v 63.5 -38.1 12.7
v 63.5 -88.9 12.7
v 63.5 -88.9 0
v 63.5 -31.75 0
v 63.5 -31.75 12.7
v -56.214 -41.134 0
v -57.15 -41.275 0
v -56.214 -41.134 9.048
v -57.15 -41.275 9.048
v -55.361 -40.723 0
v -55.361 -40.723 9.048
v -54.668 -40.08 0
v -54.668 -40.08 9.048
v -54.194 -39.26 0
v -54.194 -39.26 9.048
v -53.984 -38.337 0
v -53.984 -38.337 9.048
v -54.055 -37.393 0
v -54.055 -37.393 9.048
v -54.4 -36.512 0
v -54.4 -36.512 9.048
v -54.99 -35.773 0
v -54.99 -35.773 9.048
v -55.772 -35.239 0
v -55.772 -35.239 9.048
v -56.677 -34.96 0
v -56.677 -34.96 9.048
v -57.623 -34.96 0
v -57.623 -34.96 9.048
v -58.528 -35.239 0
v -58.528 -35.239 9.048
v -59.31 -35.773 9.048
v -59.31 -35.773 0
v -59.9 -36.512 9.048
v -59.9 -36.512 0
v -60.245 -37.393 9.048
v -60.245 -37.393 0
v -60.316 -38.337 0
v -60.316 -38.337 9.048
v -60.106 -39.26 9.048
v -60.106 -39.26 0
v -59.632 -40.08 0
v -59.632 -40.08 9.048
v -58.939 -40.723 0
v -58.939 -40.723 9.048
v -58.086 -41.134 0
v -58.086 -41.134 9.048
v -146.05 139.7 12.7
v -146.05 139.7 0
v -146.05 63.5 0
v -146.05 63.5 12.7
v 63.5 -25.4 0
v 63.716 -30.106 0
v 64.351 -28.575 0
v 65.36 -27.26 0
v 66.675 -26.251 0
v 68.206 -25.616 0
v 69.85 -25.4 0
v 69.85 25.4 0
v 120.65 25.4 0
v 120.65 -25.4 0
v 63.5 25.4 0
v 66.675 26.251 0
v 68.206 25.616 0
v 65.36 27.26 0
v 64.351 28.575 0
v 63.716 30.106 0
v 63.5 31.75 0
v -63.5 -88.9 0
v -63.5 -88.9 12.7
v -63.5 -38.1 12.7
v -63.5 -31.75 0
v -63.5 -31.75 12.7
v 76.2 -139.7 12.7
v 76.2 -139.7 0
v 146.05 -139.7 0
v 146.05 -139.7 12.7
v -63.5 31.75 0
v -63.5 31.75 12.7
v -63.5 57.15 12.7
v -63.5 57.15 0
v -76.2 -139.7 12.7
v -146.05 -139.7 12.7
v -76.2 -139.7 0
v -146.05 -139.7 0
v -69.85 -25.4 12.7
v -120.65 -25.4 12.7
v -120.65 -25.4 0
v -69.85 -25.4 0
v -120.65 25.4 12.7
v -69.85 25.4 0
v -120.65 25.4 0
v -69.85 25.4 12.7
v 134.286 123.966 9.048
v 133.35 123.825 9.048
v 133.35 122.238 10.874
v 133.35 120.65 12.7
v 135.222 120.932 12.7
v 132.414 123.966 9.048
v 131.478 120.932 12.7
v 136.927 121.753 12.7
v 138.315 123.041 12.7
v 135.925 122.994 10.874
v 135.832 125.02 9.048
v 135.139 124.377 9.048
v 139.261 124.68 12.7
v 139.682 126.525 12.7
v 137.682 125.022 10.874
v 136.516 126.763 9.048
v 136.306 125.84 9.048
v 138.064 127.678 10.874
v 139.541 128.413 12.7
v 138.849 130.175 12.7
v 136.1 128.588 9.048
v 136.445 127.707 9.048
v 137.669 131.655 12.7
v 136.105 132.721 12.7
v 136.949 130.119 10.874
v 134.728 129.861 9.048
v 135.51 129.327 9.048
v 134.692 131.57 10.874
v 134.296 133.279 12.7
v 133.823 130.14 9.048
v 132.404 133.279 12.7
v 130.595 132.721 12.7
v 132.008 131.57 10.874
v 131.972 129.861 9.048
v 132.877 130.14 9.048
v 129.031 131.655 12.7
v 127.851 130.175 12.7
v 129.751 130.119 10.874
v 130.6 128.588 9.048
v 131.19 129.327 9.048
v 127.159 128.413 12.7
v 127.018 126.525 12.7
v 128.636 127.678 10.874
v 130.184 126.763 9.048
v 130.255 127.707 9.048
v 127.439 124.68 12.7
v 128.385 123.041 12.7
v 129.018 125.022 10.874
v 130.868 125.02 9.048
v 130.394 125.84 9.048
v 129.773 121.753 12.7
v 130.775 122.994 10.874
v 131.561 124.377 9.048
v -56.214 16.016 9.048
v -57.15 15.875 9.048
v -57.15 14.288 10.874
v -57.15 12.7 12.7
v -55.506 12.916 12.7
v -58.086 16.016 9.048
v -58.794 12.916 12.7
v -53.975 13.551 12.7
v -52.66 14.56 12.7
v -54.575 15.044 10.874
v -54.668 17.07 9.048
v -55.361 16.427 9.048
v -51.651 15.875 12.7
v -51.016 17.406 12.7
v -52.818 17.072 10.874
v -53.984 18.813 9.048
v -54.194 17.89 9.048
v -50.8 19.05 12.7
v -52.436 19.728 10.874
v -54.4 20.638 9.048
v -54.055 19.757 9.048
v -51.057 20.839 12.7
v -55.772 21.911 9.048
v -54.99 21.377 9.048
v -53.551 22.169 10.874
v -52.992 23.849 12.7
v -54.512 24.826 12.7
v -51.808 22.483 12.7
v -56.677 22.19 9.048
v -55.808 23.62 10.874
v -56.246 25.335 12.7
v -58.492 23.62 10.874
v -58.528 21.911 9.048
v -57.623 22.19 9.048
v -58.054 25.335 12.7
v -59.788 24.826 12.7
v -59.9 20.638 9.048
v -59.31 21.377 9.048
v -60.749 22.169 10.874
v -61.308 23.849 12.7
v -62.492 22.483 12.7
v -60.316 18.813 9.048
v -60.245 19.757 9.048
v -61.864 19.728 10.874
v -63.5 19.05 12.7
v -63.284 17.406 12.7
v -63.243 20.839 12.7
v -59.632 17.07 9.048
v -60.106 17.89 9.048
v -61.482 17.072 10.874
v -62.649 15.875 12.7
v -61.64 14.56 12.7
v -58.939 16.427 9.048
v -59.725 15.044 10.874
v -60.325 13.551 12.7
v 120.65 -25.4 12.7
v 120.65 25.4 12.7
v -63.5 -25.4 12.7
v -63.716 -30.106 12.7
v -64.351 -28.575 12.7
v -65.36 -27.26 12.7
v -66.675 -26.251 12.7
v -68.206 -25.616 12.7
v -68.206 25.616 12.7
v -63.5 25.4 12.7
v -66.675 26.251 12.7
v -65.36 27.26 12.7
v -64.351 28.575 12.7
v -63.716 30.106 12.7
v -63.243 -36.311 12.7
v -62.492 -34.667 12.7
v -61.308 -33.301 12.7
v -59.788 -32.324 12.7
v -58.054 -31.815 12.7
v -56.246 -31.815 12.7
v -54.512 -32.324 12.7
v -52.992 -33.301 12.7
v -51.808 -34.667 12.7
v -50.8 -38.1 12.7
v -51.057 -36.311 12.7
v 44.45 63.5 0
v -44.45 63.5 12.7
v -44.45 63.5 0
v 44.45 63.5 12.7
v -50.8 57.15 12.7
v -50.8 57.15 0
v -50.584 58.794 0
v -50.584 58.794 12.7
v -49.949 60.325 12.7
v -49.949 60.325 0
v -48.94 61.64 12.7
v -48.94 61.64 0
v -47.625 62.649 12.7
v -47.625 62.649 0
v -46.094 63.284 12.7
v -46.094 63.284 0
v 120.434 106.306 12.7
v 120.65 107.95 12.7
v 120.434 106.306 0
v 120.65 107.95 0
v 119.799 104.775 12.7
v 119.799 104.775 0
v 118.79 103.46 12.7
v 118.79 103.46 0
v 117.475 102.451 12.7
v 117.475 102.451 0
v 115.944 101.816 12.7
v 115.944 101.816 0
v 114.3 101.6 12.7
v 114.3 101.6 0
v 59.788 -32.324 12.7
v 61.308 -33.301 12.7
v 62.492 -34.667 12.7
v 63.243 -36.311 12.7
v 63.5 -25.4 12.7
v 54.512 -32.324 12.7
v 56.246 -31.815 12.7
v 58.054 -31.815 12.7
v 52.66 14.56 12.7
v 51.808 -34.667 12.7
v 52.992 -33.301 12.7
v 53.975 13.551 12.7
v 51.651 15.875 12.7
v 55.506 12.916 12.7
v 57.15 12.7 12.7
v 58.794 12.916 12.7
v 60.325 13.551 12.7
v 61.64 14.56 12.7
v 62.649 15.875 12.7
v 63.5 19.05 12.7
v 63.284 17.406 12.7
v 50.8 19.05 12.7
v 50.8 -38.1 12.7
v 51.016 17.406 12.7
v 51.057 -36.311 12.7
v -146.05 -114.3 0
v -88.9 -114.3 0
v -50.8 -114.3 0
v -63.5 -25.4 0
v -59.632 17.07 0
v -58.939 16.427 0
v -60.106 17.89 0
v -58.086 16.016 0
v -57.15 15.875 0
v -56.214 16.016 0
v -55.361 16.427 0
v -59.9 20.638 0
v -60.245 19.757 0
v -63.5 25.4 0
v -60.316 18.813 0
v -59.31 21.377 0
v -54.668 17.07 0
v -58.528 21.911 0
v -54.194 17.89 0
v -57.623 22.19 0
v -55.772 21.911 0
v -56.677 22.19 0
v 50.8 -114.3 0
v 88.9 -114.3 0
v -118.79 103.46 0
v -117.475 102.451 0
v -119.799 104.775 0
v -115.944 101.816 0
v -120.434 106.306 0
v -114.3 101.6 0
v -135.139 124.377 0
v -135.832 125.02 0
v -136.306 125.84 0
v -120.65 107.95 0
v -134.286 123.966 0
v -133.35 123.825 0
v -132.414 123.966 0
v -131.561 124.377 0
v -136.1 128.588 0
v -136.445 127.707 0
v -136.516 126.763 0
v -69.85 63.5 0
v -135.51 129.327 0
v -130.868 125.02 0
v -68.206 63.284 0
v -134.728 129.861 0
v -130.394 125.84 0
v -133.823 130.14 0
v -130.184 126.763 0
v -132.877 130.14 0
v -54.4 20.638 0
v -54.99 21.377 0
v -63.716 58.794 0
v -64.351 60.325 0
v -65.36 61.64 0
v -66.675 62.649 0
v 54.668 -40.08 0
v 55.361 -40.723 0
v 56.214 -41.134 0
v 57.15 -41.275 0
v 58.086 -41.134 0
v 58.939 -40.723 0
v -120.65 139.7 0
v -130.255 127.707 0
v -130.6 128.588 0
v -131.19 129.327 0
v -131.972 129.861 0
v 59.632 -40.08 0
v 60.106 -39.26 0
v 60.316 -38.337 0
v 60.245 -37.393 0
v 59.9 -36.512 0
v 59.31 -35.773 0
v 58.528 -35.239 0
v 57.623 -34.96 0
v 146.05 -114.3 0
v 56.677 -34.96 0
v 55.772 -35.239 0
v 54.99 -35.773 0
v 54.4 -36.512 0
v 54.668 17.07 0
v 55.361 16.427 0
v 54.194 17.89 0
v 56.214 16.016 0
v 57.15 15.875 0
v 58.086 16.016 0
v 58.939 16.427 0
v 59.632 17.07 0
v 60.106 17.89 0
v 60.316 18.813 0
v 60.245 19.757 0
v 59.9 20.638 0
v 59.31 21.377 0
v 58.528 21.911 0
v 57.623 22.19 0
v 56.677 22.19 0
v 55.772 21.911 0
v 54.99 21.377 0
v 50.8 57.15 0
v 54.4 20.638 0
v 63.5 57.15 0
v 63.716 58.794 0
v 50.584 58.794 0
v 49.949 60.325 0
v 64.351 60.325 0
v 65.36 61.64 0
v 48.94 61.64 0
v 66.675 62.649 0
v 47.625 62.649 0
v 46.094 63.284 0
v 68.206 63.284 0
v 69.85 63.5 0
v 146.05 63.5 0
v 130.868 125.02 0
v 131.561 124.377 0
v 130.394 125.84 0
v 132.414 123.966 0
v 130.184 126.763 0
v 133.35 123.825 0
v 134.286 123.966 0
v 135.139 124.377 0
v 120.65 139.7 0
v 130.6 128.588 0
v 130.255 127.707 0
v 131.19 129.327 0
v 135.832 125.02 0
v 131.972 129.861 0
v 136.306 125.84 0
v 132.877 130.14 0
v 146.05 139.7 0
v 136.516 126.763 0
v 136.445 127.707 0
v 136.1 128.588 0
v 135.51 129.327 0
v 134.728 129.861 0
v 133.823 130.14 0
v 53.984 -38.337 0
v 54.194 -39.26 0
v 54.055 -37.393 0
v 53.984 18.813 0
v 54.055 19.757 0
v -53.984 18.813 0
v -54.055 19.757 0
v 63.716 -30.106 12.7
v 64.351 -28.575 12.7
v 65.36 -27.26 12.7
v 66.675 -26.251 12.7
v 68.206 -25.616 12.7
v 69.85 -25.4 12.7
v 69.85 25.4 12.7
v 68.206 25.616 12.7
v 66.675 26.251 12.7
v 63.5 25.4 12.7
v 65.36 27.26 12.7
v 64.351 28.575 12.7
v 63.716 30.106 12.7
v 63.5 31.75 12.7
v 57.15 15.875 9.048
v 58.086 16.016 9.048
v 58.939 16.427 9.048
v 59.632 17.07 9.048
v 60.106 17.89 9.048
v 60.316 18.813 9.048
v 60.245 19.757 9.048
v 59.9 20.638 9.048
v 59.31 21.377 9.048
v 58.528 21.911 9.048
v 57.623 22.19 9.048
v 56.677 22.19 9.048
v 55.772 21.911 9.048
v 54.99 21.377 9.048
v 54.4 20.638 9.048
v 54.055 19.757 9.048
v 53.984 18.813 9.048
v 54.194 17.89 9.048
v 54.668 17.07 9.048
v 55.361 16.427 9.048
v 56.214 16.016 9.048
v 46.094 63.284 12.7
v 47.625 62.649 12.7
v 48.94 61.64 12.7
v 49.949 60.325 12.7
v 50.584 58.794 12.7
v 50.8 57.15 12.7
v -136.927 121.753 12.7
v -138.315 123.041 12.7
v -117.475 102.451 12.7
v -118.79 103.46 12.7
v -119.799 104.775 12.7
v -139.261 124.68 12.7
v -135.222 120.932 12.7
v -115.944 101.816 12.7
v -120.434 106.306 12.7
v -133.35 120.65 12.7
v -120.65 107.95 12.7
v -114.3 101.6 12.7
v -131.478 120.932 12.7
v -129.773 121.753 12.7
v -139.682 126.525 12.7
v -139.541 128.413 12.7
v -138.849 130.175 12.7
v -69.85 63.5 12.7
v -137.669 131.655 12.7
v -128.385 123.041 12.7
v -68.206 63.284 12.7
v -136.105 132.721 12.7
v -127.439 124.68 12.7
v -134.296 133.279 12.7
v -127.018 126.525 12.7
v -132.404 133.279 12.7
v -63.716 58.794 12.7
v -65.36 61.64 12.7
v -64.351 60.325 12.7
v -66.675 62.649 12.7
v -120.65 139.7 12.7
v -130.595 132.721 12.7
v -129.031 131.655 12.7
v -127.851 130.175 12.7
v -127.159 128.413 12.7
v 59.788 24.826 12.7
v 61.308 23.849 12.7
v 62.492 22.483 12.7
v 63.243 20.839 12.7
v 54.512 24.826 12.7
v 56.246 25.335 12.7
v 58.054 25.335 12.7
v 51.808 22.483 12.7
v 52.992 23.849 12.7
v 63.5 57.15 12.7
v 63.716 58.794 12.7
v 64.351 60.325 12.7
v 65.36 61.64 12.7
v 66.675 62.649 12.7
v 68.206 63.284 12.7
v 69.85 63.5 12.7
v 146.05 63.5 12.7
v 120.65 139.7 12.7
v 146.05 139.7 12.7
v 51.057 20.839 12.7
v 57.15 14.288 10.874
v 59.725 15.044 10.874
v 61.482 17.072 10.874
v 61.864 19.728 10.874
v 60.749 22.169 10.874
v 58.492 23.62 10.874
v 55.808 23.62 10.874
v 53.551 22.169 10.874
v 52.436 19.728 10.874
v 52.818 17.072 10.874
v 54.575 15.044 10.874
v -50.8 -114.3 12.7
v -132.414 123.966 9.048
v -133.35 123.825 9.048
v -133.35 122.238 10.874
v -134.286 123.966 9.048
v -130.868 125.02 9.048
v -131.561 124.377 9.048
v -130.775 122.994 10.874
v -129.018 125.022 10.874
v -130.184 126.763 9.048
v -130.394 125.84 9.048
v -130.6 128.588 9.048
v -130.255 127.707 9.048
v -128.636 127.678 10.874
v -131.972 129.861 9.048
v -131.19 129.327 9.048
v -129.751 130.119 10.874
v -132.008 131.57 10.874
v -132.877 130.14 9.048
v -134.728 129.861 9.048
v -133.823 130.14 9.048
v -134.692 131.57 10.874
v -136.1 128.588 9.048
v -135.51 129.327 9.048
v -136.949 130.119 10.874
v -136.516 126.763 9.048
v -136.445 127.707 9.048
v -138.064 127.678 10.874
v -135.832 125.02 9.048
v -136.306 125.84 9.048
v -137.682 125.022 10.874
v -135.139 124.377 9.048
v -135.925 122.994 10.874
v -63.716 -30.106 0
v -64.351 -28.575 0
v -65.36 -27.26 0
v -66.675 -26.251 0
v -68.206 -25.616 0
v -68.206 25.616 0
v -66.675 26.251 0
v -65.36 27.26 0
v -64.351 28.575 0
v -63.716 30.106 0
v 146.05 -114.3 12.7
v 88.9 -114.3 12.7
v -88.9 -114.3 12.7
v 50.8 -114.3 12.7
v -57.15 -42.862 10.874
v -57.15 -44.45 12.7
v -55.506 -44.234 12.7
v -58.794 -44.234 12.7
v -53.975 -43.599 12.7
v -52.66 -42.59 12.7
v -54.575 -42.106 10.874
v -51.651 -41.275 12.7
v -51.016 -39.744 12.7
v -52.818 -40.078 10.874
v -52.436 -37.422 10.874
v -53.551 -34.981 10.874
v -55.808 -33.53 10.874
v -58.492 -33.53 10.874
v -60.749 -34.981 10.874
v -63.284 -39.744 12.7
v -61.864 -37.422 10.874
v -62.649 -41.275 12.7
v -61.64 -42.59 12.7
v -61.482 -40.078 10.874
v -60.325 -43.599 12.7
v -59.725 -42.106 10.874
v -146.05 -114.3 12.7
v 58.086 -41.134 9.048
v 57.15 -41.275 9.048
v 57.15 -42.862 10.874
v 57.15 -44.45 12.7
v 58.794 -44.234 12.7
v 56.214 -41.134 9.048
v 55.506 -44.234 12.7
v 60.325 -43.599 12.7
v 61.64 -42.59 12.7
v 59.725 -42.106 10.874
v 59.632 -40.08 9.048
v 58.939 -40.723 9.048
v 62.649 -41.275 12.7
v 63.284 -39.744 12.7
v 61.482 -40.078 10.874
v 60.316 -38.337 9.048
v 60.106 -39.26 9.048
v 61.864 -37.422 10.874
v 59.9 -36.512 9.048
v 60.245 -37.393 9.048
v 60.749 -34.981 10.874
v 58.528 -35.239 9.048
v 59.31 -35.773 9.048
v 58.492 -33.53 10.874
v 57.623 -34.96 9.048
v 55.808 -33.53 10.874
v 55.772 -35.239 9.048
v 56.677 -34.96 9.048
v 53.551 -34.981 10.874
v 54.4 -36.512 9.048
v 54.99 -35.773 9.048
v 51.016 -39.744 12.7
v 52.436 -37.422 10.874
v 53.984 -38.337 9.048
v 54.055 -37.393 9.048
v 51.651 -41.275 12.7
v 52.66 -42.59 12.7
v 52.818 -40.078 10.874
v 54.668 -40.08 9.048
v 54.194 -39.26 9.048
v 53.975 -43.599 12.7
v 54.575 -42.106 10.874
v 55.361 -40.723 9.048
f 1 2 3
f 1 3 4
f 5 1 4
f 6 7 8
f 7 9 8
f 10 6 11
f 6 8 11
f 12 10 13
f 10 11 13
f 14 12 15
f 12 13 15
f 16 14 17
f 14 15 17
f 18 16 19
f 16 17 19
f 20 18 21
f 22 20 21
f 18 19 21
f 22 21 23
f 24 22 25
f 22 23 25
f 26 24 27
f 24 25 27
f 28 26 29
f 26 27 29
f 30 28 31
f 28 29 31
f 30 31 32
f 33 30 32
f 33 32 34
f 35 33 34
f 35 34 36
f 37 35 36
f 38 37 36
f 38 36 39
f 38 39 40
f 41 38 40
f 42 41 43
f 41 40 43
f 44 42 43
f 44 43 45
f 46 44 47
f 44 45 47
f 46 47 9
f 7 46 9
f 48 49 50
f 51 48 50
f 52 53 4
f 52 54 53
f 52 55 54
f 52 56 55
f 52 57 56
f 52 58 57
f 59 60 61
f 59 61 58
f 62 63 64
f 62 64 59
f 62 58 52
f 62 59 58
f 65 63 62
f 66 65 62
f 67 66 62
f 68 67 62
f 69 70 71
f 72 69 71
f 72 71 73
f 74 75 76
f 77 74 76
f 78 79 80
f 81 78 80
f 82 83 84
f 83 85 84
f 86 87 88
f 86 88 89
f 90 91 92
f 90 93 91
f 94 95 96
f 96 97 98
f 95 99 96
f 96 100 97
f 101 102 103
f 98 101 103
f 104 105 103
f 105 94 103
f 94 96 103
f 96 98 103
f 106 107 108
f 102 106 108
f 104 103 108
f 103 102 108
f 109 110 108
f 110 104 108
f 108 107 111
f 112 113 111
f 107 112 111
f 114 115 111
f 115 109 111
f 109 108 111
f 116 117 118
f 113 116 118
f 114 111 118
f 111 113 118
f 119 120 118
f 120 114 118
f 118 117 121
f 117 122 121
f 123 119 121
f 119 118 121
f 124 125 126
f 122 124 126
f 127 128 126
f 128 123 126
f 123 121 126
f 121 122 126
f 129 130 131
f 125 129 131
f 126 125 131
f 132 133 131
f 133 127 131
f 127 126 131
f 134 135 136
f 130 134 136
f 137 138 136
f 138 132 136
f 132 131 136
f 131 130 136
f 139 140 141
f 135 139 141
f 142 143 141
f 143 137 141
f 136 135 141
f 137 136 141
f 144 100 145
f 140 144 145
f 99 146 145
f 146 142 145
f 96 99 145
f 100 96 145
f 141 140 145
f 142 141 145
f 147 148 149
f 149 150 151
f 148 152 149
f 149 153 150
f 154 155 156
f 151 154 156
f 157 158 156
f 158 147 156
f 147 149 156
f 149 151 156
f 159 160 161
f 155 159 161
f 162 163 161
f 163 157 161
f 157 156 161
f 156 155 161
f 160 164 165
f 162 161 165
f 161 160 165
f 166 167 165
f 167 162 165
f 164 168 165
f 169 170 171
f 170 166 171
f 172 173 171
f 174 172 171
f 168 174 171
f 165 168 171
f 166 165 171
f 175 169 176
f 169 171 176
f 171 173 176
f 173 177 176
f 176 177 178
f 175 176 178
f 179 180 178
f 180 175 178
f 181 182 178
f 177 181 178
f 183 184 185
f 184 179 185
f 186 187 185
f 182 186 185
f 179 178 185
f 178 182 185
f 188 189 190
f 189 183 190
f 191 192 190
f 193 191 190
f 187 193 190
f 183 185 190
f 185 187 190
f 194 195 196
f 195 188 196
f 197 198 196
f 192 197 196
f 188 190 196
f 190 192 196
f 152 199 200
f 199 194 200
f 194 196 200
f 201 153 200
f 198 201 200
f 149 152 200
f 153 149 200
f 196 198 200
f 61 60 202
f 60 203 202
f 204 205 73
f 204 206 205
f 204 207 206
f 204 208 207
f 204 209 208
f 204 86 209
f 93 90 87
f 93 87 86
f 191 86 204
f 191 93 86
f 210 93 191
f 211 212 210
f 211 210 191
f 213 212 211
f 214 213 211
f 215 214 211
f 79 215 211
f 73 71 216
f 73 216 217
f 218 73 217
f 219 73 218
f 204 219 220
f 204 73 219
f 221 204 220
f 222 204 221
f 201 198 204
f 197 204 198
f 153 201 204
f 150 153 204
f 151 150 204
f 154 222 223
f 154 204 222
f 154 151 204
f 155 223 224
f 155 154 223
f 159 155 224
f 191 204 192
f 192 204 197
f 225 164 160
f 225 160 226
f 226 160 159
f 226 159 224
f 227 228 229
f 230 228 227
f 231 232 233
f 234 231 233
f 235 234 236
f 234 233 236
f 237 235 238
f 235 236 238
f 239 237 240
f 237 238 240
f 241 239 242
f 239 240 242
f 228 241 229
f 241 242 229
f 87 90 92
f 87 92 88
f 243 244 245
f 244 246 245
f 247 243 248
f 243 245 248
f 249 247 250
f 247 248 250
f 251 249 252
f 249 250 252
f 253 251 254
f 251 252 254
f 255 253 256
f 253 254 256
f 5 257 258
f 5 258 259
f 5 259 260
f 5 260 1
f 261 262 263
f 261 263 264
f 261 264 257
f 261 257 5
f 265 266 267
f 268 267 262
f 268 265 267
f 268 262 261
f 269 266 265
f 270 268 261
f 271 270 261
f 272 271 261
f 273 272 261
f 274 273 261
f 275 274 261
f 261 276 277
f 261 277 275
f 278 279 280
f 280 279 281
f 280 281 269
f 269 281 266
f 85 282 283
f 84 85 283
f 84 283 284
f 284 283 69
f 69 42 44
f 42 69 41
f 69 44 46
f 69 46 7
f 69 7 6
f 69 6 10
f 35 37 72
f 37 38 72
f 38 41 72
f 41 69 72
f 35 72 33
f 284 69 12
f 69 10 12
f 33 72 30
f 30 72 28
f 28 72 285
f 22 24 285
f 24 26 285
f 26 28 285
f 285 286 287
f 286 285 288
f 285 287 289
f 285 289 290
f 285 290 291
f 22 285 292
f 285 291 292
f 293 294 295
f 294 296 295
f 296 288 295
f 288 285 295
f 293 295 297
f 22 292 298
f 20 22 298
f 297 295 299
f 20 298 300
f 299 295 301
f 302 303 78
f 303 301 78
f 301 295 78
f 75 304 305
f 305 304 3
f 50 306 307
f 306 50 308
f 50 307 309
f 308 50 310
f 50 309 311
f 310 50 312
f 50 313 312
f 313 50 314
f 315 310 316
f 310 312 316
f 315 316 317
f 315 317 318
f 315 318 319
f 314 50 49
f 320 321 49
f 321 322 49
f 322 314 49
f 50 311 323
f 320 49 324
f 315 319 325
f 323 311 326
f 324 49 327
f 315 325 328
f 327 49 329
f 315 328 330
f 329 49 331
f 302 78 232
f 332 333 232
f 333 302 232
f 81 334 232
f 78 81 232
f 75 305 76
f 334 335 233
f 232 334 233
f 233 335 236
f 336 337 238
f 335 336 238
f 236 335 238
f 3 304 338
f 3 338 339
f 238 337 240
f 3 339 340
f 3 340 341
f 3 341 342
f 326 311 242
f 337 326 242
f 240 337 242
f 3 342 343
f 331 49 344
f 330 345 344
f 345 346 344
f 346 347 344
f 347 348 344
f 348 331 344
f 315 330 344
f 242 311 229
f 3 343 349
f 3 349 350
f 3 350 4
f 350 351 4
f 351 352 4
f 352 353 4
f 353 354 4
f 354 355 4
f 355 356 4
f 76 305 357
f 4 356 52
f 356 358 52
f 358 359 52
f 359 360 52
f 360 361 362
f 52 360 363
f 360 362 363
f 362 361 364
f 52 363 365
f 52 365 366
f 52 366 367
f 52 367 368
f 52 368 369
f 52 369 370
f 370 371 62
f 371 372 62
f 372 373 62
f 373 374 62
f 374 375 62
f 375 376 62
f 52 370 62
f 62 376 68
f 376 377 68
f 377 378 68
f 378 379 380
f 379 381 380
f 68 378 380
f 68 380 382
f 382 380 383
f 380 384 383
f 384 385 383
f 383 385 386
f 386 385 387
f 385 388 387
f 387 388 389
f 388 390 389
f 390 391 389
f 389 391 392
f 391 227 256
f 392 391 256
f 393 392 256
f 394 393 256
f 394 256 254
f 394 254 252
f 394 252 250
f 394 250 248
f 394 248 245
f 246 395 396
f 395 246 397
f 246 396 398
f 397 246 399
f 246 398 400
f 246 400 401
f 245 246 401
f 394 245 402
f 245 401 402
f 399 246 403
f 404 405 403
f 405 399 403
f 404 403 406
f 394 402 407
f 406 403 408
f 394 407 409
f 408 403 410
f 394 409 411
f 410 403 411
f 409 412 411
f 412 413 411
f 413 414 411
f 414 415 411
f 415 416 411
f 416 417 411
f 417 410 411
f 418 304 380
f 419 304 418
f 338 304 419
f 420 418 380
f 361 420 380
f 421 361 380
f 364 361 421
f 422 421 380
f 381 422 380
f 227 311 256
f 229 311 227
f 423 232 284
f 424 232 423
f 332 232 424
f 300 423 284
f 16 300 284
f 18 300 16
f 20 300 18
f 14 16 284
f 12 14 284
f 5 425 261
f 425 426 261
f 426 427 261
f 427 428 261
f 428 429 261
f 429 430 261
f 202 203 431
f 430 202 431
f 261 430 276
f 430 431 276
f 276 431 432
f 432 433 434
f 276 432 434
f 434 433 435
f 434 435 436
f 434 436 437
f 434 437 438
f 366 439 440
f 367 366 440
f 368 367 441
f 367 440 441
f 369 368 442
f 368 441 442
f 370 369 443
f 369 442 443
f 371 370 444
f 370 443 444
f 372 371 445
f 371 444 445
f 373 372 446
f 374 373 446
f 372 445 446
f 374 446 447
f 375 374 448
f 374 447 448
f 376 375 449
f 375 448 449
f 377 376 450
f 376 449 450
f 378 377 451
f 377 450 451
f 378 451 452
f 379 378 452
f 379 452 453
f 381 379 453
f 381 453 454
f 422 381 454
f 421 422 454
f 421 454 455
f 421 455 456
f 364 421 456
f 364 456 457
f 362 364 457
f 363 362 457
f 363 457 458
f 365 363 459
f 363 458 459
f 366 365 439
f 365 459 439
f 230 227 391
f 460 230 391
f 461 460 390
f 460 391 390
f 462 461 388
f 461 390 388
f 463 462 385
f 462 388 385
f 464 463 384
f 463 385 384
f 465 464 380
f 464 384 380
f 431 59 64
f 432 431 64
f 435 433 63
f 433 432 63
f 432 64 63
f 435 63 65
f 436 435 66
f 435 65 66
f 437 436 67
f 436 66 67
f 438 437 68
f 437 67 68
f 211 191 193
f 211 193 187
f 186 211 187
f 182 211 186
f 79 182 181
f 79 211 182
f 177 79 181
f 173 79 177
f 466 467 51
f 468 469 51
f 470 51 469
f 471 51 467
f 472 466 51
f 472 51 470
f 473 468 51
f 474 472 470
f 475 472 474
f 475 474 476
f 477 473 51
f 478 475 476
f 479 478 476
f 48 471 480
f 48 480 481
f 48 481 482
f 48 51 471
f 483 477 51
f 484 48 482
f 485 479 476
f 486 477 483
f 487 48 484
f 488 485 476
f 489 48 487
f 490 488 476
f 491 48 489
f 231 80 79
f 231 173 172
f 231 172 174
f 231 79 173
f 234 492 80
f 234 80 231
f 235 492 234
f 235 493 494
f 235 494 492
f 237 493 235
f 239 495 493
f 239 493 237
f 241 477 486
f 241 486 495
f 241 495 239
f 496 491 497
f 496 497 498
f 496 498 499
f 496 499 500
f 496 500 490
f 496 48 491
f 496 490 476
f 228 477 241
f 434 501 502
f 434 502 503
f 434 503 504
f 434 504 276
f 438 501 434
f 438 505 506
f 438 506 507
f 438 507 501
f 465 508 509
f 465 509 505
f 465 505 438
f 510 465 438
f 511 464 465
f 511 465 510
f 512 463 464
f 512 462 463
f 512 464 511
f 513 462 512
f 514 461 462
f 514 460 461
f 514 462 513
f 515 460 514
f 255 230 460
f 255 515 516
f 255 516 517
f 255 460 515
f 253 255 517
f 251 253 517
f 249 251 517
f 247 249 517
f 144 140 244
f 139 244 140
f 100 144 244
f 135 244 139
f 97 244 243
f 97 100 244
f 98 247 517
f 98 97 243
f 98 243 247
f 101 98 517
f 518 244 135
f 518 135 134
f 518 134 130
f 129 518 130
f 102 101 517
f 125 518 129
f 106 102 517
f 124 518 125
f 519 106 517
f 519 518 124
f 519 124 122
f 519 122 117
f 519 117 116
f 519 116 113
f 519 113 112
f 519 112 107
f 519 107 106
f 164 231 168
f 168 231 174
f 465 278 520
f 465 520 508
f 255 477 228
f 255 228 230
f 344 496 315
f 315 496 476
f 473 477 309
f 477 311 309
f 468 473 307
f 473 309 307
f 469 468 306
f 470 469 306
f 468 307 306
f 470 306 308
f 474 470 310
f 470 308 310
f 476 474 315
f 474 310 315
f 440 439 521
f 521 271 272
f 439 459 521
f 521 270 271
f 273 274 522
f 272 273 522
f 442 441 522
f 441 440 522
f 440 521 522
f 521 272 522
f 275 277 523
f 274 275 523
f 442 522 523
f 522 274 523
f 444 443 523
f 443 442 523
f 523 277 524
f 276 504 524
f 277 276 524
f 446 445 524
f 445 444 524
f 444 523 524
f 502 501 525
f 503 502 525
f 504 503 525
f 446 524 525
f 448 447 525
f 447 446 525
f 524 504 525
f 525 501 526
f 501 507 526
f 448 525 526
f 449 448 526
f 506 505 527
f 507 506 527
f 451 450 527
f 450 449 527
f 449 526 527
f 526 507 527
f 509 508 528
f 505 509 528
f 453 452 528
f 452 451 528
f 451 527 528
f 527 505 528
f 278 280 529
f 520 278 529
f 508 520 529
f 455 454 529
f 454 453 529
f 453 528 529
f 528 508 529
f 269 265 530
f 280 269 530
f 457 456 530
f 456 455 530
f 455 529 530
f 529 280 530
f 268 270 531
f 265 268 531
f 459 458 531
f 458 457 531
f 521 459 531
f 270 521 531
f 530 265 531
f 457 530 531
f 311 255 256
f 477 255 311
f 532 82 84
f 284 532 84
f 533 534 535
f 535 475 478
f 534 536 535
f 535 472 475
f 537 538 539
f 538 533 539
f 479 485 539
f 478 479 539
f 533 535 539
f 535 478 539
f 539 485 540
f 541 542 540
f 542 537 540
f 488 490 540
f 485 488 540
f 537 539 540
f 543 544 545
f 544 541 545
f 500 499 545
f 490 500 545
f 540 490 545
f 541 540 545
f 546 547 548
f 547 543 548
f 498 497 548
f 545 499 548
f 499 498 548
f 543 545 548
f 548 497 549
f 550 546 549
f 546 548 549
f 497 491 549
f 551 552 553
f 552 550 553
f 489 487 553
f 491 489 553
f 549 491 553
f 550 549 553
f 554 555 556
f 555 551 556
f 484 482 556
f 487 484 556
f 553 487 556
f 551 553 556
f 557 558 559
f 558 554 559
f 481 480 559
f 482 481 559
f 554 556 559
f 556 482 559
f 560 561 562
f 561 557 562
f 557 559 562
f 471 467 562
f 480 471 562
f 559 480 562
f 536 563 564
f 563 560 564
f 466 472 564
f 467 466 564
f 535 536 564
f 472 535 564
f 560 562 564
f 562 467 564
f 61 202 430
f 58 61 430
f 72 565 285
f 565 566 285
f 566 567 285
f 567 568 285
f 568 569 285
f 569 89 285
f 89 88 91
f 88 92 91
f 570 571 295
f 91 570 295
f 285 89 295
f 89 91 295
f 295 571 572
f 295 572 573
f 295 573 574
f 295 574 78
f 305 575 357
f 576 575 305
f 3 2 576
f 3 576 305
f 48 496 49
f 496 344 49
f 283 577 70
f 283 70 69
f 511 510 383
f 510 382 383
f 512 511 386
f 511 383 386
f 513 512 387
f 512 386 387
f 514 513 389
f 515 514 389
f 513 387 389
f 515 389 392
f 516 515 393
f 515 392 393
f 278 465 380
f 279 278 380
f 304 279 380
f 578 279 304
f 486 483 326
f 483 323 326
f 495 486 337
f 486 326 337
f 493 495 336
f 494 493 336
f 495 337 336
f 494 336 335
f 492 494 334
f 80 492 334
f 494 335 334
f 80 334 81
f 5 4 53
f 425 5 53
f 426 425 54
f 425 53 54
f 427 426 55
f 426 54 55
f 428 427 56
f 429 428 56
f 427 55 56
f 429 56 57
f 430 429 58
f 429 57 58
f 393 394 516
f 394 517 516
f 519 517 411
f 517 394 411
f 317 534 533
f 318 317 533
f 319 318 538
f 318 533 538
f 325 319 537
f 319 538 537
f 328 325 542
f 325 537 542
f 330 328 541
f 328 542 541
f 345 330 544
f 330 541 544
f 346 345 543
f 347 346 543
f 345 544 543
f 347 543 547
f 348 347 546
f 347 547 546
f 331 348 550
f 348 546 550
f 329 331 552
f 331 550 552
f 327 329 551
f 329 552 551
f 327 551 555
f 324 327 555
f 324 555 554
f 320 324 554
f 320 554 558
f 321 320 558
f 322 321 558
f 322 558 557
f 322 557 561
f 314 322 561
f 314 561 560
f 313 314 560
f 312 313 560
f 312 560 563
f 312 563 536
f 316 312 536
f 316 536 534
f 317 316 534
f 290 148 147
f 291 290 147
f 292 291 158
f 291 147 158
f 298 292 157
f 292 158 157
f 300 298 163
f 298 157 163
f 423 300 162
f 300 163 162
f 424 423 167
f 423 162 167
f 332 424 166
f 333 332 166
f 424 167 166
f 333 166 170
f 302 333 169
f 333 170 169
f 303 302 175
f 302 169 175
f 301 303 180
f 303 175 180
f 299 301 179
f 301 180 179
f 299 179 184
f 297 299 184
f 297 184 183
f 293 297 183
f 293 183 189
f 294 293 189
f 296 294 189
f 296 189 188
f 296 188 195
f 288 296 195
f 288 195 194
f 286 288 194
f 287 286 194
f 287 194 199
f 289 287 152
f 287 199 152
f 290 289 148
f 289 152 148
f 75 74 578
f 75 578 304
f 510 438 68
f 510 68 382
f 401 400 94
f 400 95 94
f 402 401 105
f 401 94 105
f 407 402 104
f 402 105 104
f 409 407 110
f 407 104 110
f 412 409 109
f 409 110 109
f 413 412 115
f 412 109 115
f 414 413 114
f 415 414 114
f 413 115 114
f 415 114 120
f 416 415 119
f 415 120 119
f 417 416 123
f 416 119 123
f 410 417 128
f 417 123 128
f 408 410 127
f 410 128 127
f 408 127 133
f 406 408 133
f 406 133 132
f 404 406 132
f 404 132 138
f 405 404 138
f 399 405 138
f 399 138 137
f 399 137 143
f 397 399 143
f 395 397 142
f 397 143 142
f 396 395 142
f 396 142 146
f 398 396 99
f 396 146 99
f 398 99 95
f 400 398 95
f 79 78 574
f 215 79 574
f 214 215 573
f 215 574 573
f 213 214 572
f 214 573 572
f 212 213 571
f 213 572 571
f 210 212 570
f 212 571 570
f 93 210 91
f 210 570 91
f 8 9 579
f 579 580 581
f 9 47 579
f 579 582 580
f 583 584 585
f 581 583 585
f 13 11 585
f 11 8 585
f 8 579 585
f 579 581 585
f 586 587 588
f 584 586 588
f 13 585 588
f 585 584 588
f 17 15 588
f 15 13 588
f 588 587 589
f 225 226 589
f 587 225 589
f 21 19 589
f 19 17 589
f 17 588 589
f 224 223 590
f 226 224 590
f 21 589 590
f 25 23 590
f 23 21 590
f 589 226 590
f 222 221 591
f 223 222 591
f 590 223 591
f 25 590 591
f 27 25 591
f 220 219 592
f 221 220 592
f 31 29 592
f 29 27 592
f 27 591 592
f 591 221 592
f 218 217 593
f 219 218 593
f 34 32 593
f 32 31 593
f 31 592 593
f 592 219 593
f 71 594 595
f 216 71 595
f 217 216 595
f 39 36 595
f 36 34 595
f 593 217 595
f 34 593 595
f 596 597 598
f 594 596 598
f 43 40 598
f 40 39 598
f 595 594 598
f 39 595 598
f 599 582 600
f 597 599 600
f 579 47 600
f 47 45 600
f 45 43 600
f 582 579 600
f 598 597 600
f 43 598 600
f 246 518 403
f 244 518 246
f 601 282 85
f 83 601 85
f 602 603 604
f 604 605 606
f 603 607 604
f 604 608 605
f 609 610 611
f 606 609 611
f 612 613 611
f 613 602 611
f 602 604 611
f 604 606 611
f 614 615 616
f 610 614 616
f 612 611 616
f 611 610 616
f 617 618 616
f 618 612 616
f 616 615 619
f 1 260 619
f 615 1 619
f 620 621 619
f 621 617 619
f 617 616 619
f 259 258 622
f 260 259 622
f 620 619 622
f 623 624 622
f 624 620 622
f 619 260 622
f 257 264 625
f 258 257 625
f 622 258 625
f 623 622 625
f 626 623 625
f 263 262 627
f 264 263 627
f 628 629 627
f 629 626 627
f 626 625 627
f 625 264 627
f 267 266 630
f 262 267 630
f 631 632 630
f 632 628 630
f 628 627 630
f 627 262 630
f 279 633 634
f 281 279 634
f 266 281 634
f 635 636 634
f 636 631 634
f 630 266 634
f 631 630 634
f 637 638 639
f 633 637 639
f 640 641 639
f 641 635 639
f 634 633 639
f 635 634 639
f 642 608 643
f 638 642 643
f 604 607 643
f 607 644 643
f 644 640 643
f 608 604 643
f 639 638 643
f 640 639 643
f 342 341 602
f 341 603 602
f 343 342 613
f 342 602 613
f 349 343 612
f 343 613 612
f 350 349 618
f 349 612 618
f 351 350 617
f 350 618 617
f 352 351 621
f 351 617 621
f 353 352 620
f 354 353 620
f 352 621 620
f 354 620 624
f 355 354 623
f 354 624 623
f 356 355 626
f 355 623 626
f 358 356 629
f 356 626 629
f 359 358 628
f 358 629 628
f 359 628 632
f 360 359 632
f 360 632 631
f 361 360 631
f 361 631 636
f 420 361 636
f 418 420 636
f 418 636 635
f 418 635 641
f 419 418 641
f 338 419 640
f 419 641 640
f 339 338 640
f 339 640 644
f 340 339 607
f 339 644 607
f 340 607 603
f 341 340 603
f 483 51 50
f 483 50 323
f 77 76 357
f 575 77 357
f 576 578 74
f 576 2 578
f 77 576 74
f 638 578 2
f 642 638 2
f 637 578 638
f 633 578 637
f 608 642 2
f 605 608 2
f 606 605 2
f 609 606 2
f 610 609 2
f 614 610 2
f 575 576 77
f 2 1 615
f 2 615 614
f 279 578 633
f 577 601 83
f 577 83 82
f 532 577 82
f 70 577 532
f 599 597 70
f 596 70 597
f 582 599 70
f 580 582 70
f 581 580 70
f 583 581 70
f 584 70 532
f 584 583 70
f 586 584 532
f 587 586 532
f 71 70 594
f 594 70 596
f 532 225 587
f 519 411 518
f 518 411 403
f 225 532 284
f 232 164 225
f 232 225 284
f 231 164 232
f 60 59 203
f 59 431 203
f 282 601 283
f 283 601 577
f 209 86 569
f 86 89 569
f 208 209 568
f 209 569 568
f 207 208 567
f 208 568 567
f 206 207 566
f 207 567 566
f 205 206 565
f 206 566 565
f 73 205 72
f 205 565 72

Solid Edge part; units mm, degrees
sketch "Sketch1" plane through (0, 0, 0) normal (0, 0, 1) x (1, 0, 0)
  line L0 (-146.05, 139.7) -> (-146.05, -139.7)
  line L1 (-146.05, -139.7) -> (146.05, -139.7)
  line L2 (146.05, -139.7) -> (146.05, 139.7)
  line L3 (146.05, 139.7) -> (-146.05, 139.7)
  dimension "D1" = 292.1
  dimension "D2" = 279.4
extrude "Protrusion1" add sketch "Sketch1" along normal blind 12.7
sketch "Sketch2" plane through (0, 0, 12.7) normal (0, 0, 1) x (1, 0, 0)
  line L0 (-50.8, -139.7) -> (-50.8, 63.5)
  line L1 (-50.8, 63.5) -> (50.8, 63.5)
  line L2 (50.8, 63.5) -> (50.8, -139.7)
  line L3 (50.8, -139.7) -> (-50.8, -139.7)
  dimension "D1" = 203.2
  dimension "D2" = 101.6
  dimension "D3" = 95.25
  dimension "D4" = 95.25
extrude "Cutout1" cut sketch "Sketch2" against normal up to next
sketch "Sketch3" plane through (0, 0, 12.7) normal (0, 0, 1) x (1, 0, 0)
  line L0 (146.05, 38.1) -> (146.05, -38.1)
  line L1 (146.05, -38.1) -> (127, -38.1)
  line L2 (127, -38.1) -> (127, 38.1)
  line L3 (127, 38.1) -> (146.05, 38.1)
  line L4 (-146.05, 38.1) -> (-146.05, -38.1)
  line L5 (-146.05, -38.1) -> (-127, -38.1)
  line L6 (-127, -38.1) -> (-127, 38.1)
  line L7 (-127, 38.1) -> (-146.05, 38.1)
  dimension "D1" = 19.05
  dimension "D2" = 76.2
  dimension "D3" = 101.6
  dimension "D4" = 76.2
extrude "Cutout2" cut sketch "Sketch3" against normal up to next
sketch "Sketch4" plane through (0, 0, 12.7) normal (0, 0, 1) x (1, 0, 0)
  line L0 (120.65, 101.6) -> (-120.65, 101.6)
  line L1 (-120.65, 139.7) -> (-120.65, 101.6)
  line L2 (120.65, 139.7) -> (-120.65, 139.7)
  line L3 (120.65, 139.7) -> (120.65, 101.6)
  line L4 (146.05, -114.3) -> (63.5, -114.3)
  line L5 (63.5, -114.3) -> (63.5, 63.5)
  line L6 (146.05, 63.5) -> (63.5, 63.5)
  line L7 (146.05, 63.5) -> (146.05, 38.1)
  line L8 (146.05, 38.1) -> (127, 38.1)
  line L9 (127, -38.1) -> (127, 38.1)
  line L10 (146.05, -38.1) -> (127, -38.1)
  line L11 (146.05, -38.1) -> (146.05, -114.3)
  line L12 (-146.05, -114.3) -> (-63.5, -114.3)
  line L13 (-63.5, -114.3) -> (-63.5, 63.5)
  line L14 (-146.05, 63.5) -> (-63.5, 63.5)
  line L15 (-146.05, 63.5) -> (-146.05, 38.1)
  line L16 (-146.05, 38.1) -> (-127, 38.1)
  line L17 (-127, -38.1) -> (-127, 38.1)
  line L18 (-146.05, -38.1) -> (-127, -38.1)
  line L19 (-146.05, -38.1) -> (-146.05, -114.3)
  dimension "D1" = 25.4
  dimension "D2" = 25.4
  dimension "D3" = 38.1
  dimension "D4" = 25.4
  dimension "D5" = 12.7
extrude "Cutout3" cut sketch "Sketch4" against normal through all
chamfer "Chamfer_1" distance 25.4 angle 45 4 edges at (-63.5, -114.3, 6.35) (-50.8, -139.7, 6.35) (50.8, -139.7, 6.35) (63.5, -114.3, 6.35)
hole "Hole_1" at (-57.15, -38.1, 12.7) direction (0, 0, -1) diameter 6.35 end up to next countersink diameter 12.7 countersink angle 82
hole "Hole1" at (57.15, -38.1, 12.7) direction (0, 0, -1) diameter 6.35 end up to next countersink diameter 12.7 countersink angle 82
hole "Hole2" at (57.15, 19.05, 12.7) direction (0, 0, -1) diameter 6.35 end up to next countersink diameter 12.7 countersink angle 82
hole "Hole3" at (-57.15, 19.05, 12.7) direction (0, 0, -1) diameter 6.35 end up to next countersink diameter 12.7 countersink angle 82
sketch "Sketch5" plane through (0, 0, 12.7) normal (0, 0, 1) x (1, 0, 0)
  line L0 (120.65, 25.4) -> (120.65, -25.4)
  line L1 (120.65, -25.4) -> (63.5, -25.4)
  line L2 (63.5, -25.4) -> (63.5, 25.4)
  line L3 (63.5, 25.4) -> (120.65, 25.4)
  line L4 (-120.65, 25.4) -> (-120.65, -25.4)
  line L5 (-120.65, -25.4) -> (-63.5, -25.4)
  line L6 (-63.5, -25.4) -> (-63.5, 25.4)
  line L7 (-63.5, 25.4) -> (-120.65, 25.4)
  dimension "D1" = 114.3
  dimension "D2" = 50.8
  dimension "D3" = 25.4
extrude "ExtrudedProtrusion_2" add sketch "Sketch5" against normal blind 12.7
hole "Hole4" at (133.35, 127, 12.7) direction (0, 0, -1) diameter 6.35 end up to next countersink diameter 12.7 countersink angle 82
hole "Hole5" at (-133.35, 127, 12.7) direction (0, 0, -1) diameter 6.35 end up to next countersink diameter 12.7 countersink angle 82
fillet "Round_1" radius 6.35 10 edges at (-63.5, 63.5, 6.35) (-63.5, 25.4, 6.35) (-63.5, -25.4, 6.35) (63.5, 63.5, 6.35) (63.5, 25.4, 6.35) (63.5, -25.4, 6.35) (-50.8, 63.5, 6.35) (50.8, 63.5, 6.35) (-120.65, 101.6, 6.35) (120.65, 101.6, 6.35)
properties part number "CHAS-01"
